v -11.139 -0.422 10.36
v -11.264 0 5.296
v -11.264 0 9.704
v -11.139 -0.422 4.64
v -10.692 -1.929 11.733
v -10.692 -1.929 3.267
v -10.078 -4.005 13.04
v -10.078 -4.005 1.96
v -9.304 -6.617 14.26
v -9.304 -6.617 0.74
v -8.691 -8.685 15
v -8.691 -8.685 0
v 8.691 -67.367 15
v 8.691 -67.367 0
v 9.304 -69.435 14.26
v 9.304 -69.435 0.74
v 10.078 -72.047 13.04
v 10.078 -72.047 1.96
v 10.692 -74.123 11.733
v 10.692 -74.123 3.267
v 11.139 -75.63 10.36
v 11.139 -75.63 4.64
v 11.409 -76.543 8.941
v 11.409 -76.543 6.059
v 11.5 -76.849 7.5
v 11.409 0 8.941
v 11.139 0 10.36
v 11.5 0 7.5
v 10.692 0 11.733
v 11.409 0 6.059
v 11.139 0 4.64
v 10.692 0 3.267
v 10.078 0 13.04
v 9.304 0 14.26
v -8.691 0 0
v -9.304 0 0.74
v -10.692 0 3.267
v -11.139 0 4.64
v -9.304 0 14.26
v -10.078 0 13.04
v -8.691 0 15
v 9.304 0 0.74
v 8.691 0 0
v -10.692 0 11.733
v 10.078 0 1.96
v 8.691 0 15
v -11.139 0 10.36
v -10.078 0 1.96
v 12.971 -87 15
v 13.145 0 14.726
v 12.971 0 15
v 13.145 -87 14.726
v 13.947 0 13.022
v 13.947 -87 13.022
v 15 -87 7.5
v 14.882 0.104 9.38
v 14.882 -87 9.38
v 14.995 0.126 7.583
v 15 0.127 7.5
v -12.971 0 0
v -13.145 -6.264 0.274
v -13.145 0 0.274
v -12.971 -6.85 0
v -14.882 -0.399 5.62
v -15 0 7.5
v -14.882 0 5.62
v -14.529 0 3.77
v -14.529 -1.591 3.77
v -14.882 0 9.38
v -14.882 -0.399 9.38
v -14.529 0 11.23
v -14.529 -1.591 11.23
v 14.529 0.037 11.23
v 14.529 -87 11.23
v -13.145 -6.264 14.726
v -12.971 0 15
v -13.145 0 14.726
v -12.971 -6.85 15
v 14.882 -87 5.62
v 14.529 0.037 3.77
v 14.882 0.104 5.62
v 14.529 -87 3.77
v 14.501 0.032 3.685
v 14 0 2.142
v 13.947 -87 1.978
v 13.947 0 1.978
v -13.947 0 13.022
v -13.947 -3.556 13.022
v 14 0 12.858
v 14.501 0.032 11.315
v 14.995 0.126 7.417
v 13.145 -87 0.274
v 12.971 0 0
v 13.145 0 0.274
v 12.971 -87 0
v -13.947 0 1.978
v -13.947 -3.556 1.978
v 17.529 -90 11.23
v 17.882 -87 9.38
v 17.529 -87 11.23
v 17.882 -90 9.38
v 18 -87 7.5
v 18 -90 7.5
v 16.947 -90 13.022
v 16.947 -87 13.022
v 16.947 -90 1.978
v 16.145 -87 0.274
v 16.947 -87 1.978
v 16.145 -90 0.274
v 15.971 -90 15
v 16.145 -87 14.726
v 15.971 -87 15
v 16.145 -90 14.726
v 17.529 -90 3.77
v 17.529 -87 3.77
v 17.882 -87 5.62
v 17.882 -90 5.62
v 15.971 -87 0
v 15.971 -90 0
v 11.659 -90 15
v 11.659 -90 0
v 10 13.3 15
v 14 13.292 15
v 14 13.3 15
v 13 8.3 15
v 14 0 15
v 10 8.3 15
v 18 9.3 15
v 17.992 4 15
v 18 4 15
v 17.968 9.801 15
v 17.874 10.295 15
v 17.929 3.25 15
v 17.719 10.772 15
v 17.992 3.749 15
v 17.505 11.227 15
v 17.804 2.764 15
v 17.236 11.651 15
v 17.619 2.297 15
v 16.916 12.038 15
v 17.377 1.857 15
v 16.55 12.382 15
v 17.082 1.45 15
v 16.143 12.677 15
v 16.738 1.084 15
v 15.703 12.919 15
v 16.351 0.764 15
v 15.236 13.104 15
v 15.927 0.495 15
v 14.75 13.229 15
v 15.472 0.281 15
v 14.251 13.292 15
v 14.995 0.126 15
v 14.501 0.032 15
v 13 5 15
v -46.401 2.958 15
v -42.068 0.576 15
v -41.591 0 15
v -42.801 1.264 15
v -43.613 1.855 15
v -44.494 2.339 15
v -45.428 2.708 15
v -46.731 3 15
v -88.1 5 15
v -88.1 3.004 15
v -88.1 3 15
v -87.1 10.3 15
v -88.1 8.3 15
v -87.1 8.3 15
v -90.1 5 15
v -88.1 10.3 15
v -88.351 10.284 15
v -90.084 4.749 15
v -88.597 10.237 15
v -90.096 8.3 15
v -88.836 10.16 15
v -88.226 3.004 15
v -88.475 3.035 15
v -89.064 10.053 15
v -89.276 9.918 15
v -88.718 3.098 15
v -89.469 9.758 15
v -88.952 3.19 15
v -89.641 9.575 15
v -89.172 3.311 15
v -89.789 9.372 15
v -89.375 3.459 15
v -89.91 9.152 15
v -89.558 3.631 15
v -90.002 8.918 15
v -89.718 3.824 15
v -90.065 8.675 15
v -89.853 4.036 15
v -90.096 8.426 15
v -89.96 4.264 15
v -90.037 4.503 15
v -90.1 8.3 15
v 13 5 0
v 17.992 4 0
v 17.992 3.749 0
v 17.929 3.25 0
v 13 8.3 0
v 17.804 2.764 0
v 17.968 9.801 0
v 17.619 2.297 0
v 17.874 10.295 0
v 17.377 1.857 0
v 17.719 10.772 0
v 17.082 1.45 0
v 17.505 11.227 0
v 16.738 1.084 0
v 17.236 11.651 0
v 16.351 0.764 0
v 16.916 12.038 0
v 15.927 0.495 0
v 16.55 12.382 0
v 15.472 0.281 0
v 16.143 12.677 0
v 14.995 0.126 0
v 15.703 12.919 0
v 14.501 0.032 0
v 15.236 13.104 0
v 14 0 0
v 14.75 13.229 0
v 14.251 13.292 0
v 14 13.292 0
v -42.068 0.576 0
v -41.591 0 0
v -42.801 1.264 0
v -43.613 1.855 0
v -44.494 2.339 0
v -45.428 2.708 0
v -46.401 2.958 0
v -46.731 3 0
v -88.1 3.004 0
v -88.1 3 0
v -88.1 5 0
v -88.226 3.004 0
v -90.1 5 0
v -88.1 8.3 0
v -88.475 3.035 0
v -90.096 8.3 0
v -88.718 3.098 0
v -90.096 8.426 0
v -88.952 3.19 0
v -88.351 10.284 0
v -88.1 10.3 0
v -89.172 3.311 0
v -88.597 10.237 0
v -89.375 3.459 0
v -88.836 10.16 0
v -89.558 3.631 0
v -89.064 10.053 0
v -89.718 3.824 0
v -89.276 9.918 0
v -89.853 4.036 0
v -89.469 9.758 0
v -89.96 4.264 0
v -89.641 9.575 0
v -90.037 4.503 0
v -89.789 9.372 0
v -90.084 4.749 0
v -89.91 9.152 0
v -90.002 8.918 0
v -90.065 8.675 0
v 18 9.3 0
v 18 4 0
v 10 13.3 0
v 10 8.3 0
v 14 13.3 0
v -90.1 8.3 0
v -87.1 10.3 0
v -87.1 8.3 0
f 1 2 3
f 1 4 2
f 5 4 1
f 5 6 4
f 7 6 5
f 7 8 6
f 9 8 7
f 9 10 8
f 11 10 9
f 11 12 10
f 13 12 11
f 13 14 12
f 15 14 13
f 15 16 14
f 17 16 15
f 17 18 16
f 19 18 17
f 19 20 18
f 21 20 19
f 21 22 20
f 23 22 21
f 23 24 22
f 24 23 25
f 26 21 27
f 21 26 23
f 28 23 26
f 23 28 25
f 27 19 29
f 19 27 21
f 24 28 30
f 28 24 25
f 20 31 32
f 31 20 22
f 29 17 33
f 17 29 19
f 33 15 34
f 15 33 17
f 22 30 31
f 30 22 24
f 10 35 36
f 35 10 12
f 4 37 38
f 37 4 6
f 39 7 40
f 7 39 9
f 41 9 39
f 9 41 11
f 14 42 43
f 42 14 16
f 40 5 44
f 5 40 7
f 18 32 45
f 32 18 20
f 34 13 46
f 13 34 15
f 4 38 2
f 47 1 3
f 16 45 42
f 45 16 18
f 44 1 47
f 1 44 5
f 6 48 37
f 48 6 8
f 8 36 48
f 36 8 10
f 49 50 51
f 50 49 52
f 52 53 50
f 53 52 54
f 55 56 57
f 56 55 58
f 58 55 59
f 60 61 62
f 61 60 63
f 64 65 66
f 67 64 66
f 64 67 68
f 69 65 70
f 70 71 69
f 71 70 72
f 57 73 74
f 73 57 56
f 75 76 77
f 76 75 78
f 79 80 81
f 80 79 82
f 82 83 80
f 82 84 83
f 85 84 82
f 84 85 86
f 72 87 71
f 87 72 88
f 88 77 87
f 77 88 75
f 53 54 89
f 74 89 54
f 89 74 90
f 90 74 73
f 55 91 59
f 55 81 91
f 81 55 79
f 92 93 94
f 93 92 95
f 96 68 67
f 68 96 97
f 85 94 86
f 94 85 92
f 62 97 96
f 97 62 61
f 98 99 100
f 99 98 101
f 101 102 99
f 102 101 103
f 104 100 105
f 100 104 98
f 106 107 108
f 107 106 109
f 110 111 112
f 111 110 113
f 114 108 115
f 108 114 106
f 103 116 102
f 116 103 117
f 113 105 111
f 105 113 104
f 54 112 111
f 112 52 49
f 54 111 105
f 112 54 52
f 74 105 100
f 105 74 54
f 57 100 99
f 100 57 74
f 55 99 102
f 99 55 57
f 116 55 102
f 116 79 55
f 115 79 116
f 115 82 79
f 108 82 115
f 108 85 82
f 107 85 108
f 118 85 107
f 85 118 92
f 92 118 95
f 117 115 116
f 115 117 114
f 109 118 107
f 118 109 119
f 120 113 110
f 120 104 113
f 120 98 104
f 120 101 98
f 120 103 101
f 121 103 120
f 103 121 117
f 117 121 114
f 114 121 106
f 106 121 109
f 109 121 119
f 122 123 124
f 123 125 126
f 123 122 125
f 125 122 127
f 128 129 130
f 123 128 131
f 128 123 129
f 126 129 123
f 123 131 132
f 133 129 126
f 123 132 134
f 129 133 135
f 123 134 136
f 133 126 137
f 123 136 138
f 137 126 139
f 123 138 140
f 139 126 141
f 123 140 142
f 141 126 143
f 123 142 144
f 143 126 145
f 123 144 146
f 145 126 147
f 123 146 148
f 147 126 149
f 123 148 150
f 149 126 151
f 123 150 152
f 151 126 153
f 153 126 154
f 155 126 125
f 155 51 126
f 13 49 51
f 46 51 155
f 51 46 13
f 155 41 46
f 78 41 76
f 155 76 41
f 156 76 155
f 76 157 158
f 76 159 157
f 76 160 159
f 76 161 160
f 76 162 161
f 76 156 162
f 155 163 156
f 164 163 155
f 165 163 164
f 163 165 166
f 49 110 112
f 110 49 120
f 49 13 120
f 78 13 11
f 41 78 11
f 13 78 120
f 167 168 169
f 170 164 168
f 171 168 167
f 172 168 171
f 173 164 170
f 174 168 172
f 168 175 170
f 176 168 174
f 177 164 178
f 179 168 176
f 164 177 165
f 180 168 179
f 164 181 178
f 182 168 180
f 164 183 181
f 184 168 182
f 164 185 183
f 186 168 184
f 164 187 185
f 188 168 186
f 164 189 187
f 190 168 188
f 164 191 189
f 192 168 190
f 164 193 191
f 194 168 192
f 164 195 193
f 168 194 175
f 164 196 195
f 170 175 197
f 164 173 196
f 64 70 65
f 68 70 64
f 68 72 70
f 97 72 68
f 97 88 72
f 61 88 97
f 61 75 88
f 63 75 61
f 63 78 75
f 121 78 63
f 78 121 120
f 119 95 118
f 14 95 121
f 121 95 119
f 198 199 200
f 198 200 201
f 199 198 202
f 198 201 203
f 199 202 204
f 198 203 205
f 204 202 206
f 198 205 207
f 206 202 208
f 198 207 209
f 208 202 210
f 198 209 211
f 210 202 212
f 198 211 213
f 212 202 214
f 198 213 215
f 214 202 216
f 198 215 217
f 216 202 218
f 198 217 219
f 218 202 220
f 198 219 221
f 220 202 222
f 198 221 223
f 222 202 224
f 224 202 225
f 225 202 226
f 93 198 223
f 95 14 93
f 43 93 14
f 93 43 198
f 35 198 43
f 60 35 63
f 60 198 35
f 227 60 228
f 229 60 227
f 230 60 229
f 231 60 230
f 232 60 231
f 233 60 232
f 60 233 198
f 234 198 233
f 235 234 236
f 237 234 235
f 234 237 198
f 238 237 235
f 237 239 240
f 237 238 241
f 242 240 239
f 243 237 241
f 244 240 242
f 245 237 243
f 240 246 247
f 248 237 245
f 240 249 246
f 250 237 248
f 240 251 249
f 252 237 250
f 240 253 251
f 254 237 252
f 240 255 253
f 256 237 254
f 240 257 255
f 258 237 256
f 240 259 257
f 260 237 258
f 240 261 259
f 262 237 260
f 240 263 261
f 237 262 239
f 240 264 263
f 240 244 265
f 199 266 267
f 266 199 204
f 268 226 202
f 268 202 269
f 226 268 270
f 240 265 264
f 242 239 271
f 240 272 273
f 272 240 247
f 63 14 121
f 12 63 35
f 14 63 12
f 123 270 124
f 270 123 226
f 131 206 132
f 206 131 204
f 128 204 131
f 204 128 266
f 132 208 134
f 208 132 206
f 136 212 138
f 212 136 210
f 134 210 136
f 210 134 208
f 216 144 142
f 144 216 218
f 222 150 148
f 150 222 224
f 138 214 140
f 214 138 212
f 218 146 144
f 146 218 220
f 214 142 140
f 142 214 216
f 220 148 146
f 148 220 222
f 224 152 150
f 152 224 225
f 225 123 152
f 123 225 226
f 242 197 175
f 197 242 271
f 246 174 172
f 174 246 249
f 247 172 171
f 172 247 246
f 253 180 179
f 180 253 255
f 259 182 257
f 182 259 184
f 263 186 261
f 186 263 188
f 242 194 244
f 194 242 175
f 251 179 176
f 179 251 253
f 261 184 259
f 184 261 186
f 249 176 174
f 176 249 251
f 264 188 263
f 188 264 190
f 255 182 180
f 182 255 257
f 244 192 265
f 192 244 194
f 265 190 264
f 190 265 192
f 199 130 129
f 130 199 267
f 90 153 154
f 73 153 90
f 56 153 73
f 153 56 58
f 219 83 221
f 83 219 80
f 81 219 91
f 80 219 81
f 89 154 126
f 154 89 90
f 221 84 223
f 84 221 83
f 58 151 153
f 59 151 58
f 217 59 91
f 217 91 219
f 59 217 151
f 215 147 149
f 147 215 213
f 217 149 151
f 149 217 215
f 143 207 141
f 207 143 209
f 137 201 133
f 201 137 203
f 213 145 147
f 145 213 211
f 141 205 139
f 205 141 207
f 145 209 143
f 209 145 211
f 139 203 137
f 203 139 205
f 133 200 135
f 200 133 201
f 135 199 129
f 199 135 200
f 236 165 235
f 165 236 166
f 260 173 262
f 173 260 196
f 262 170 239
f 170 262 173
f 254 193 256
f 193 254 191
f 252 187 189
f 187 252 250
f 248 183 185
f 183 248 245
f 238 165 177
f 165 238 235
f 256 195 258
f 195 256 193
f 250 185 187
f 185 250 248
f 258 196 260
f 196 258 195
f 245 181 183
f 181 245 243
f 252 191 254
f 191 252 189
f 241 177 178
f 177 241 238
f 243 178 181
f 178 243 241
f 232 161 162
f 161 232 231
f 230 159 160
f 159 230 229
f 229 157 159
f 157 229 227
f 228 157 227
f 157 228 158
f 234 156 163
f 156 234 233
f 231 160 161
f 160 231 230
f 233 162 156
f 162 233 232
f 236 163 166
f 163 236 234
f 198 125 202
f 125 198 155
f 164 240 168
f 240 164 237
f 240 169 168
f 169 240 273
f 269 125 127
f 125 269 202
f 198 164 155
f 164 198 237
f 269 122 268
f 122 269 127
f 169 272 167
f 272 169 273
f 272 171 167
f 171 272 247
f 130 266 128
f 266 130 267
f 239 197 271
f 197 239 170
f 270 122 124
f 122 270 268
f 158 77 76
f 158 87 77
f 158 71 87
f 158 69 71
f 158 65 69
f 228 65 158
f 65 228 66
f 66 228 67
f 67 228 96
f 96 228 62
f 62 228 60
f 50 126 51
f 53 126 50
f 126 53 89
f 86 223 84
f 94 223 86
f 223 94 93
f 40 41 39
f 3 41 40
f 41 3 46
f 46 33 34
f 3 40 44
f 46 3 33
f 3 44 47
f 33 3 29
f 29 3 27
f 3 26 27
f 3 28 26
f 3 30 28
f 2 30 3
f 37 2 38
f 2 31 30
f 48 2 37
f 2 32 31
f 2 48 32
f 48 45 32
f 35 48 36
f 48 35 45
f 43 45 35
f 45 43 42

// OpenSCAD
/* [Main] */
// What's the height of the gantry the holder needs to grip around? (add ~1mm to compensate shrinkage)
gantryHeight = 101.1;

// What's the thickness of the gantry the holder needs to grip aroud?
gantryThickness = 3.3;

// What is the minimum internal radius of the roll of filament?
rollRadius = 15; // [10:50]

// How much bigger spool radius do you also want to accomodate?
spoolRadiusMargin = 20; // [0:50]

// What's the width of the fillament spool?
spoolWidth = 87; //[50:200]

/* [Extra] */
// Height of the notch at the end of the holder
spoolNotch = 3; //[1:10]

// Angle of the bottom arm of the spoolholder (set this so that the end aligns)
spoolAngle = 16.5; //[5:50]

// Thickness of the spoolholder arms
spoolHolderThickness = 3.5;//[1,1.5,2,2.5,3,3.5,4,4.5,5,5.5,6,6.5,7,7.5,8,8.5,9,9.5,10]

// Thickness of the top vertical part of the holder
baseThickness = 5; //[2:10]

// Thickness of the bottom vertical part of the holder
baseThicknessBottom = 2; //[1:10]

// How much should the top wrap around?
baseNotchTop = 3; //[1:10]

// How much should the bottom wrap around? (don't make this to high, otherwise it'll be hard to snap the holder on)
baseNotchBottom = 1; //[1:5]

// How round should the corners be?
cornerRadius = 4; //[0:10]


$fn =50;


module hook() {
	translate([0,0,rollRadius/2])	rotate([90,0,0]) intersection() {
		translate([-rollRadius,-rollRadius/2,0]) rotate([0,spoolAngle,0]) cube([spoolWidth/2,rollRadius, spoolWidth*1.2]);
		union() {
			difference() {
				translate([0,0,-1]) cylinder(spoolWidth+2,rollRadius, rollRadius);
				intersection() {    // make the holder hollow, for less printing
					rotate([0,spoolAngle,0]) translate([-rollRadius+spoolHolderThickness*1.2,-rollRadius/2-1,-10]) 
						cube([spoolWidth/2,rollRadius*2, spoolWidth*1.2]);
					translate([0,0,-2]) cylinder(spoolWidth + 2, rollRadius-spoolHolderThickness, rollRadius-spoolHolderThickness);
				}
			}
			translate([spoolNotch,0,spoolWidth]) cylinder(spoolNotch, rollRadius, rollRadius);
		}
	}
}

module rounding(height, radius = 3) {
	height = height + 0.04;
	translate([0,0,-0.02]) difference() {
		cube([radius+0.02, radius+0.02, height]);
		cylinder(height, radius, radius);
	}
}



module base() {
	cubeX = gantryHeight + baseThickness + baseThicknessBottom;
	cubeY = gantryThickness + baseThickness * 2;
	cubeZ = rollRadius;

	translate([-cubeX+rollRadius+spoolNotch,0,0]) {
		difference() {
			cube([cubeX, cubeY, cubeZ]);
			union() {
				// rounded corners
				translate([cubeX-cornerRadius, cubeY-cornerRadius,0]) rounding(cubeZ, cornerRadius);
				translate([cornerRadius/2, cubeY-cornerRadius/2-baseThickness+baseThicknessBottom, 0]) rotate([0,0,90]) 
					rounding(cubeZ, cornerRadius/2);
				translate([cubeX-cornerRadius, cornerRadius, 0]) rotate([0,0,-90]) rounding(cubeZ, cornerRadius);
				translate([cornerRadius/2, cornerRadius/2+baseThickness-baseThicknessBottom, 0]) rotate([0,0,180]) 
					rounding(cubeZ, cornerRadius/2);

				// space for the gantry
				translate([baseThicknessBottom, baseThickness, -0.1]) cube([gantryHeight, gantryThickness, cubeZ+0.2]);
				translate([baseThicknessBottom+baseNotchBottom, baseThickness+gantryThickness-0.1, -0.1])
					cube([gantryHeight-baseNotchTop-baseNotchBottom, baseThickness+0.2, cubeZ+0.2]);

				// making the bottom part skinnier
				difference() {
					translate([-0.1,-0.1,-0.1]) 
						cube([cubeX-spoolNotch-rollRadius-spoolRadiusMargin*2+0.1, baseThickness-baseThicknessBottom+0.1, cubeZ+0.2]);
					translate([cubeX-spoolNotch-rollRadius-spoolRadiusMargin*2-cornerRadius*2+0.1,
								 baseThickness-baseThicknessBottom-cornerRadius*2+0.1, -0.1]) 
						rounding(cubeZ+0.2, cornerRadius*2);
				}
				translate([-0.1, baseThickness+baseThicknessBottom+gantryThickness,-0.1]) 
					cube([baseThickness+baseNotchBottom+0.2, baseThickness, cubeZ+0.2]);
			}
		}
	}
}

hook();
base();
